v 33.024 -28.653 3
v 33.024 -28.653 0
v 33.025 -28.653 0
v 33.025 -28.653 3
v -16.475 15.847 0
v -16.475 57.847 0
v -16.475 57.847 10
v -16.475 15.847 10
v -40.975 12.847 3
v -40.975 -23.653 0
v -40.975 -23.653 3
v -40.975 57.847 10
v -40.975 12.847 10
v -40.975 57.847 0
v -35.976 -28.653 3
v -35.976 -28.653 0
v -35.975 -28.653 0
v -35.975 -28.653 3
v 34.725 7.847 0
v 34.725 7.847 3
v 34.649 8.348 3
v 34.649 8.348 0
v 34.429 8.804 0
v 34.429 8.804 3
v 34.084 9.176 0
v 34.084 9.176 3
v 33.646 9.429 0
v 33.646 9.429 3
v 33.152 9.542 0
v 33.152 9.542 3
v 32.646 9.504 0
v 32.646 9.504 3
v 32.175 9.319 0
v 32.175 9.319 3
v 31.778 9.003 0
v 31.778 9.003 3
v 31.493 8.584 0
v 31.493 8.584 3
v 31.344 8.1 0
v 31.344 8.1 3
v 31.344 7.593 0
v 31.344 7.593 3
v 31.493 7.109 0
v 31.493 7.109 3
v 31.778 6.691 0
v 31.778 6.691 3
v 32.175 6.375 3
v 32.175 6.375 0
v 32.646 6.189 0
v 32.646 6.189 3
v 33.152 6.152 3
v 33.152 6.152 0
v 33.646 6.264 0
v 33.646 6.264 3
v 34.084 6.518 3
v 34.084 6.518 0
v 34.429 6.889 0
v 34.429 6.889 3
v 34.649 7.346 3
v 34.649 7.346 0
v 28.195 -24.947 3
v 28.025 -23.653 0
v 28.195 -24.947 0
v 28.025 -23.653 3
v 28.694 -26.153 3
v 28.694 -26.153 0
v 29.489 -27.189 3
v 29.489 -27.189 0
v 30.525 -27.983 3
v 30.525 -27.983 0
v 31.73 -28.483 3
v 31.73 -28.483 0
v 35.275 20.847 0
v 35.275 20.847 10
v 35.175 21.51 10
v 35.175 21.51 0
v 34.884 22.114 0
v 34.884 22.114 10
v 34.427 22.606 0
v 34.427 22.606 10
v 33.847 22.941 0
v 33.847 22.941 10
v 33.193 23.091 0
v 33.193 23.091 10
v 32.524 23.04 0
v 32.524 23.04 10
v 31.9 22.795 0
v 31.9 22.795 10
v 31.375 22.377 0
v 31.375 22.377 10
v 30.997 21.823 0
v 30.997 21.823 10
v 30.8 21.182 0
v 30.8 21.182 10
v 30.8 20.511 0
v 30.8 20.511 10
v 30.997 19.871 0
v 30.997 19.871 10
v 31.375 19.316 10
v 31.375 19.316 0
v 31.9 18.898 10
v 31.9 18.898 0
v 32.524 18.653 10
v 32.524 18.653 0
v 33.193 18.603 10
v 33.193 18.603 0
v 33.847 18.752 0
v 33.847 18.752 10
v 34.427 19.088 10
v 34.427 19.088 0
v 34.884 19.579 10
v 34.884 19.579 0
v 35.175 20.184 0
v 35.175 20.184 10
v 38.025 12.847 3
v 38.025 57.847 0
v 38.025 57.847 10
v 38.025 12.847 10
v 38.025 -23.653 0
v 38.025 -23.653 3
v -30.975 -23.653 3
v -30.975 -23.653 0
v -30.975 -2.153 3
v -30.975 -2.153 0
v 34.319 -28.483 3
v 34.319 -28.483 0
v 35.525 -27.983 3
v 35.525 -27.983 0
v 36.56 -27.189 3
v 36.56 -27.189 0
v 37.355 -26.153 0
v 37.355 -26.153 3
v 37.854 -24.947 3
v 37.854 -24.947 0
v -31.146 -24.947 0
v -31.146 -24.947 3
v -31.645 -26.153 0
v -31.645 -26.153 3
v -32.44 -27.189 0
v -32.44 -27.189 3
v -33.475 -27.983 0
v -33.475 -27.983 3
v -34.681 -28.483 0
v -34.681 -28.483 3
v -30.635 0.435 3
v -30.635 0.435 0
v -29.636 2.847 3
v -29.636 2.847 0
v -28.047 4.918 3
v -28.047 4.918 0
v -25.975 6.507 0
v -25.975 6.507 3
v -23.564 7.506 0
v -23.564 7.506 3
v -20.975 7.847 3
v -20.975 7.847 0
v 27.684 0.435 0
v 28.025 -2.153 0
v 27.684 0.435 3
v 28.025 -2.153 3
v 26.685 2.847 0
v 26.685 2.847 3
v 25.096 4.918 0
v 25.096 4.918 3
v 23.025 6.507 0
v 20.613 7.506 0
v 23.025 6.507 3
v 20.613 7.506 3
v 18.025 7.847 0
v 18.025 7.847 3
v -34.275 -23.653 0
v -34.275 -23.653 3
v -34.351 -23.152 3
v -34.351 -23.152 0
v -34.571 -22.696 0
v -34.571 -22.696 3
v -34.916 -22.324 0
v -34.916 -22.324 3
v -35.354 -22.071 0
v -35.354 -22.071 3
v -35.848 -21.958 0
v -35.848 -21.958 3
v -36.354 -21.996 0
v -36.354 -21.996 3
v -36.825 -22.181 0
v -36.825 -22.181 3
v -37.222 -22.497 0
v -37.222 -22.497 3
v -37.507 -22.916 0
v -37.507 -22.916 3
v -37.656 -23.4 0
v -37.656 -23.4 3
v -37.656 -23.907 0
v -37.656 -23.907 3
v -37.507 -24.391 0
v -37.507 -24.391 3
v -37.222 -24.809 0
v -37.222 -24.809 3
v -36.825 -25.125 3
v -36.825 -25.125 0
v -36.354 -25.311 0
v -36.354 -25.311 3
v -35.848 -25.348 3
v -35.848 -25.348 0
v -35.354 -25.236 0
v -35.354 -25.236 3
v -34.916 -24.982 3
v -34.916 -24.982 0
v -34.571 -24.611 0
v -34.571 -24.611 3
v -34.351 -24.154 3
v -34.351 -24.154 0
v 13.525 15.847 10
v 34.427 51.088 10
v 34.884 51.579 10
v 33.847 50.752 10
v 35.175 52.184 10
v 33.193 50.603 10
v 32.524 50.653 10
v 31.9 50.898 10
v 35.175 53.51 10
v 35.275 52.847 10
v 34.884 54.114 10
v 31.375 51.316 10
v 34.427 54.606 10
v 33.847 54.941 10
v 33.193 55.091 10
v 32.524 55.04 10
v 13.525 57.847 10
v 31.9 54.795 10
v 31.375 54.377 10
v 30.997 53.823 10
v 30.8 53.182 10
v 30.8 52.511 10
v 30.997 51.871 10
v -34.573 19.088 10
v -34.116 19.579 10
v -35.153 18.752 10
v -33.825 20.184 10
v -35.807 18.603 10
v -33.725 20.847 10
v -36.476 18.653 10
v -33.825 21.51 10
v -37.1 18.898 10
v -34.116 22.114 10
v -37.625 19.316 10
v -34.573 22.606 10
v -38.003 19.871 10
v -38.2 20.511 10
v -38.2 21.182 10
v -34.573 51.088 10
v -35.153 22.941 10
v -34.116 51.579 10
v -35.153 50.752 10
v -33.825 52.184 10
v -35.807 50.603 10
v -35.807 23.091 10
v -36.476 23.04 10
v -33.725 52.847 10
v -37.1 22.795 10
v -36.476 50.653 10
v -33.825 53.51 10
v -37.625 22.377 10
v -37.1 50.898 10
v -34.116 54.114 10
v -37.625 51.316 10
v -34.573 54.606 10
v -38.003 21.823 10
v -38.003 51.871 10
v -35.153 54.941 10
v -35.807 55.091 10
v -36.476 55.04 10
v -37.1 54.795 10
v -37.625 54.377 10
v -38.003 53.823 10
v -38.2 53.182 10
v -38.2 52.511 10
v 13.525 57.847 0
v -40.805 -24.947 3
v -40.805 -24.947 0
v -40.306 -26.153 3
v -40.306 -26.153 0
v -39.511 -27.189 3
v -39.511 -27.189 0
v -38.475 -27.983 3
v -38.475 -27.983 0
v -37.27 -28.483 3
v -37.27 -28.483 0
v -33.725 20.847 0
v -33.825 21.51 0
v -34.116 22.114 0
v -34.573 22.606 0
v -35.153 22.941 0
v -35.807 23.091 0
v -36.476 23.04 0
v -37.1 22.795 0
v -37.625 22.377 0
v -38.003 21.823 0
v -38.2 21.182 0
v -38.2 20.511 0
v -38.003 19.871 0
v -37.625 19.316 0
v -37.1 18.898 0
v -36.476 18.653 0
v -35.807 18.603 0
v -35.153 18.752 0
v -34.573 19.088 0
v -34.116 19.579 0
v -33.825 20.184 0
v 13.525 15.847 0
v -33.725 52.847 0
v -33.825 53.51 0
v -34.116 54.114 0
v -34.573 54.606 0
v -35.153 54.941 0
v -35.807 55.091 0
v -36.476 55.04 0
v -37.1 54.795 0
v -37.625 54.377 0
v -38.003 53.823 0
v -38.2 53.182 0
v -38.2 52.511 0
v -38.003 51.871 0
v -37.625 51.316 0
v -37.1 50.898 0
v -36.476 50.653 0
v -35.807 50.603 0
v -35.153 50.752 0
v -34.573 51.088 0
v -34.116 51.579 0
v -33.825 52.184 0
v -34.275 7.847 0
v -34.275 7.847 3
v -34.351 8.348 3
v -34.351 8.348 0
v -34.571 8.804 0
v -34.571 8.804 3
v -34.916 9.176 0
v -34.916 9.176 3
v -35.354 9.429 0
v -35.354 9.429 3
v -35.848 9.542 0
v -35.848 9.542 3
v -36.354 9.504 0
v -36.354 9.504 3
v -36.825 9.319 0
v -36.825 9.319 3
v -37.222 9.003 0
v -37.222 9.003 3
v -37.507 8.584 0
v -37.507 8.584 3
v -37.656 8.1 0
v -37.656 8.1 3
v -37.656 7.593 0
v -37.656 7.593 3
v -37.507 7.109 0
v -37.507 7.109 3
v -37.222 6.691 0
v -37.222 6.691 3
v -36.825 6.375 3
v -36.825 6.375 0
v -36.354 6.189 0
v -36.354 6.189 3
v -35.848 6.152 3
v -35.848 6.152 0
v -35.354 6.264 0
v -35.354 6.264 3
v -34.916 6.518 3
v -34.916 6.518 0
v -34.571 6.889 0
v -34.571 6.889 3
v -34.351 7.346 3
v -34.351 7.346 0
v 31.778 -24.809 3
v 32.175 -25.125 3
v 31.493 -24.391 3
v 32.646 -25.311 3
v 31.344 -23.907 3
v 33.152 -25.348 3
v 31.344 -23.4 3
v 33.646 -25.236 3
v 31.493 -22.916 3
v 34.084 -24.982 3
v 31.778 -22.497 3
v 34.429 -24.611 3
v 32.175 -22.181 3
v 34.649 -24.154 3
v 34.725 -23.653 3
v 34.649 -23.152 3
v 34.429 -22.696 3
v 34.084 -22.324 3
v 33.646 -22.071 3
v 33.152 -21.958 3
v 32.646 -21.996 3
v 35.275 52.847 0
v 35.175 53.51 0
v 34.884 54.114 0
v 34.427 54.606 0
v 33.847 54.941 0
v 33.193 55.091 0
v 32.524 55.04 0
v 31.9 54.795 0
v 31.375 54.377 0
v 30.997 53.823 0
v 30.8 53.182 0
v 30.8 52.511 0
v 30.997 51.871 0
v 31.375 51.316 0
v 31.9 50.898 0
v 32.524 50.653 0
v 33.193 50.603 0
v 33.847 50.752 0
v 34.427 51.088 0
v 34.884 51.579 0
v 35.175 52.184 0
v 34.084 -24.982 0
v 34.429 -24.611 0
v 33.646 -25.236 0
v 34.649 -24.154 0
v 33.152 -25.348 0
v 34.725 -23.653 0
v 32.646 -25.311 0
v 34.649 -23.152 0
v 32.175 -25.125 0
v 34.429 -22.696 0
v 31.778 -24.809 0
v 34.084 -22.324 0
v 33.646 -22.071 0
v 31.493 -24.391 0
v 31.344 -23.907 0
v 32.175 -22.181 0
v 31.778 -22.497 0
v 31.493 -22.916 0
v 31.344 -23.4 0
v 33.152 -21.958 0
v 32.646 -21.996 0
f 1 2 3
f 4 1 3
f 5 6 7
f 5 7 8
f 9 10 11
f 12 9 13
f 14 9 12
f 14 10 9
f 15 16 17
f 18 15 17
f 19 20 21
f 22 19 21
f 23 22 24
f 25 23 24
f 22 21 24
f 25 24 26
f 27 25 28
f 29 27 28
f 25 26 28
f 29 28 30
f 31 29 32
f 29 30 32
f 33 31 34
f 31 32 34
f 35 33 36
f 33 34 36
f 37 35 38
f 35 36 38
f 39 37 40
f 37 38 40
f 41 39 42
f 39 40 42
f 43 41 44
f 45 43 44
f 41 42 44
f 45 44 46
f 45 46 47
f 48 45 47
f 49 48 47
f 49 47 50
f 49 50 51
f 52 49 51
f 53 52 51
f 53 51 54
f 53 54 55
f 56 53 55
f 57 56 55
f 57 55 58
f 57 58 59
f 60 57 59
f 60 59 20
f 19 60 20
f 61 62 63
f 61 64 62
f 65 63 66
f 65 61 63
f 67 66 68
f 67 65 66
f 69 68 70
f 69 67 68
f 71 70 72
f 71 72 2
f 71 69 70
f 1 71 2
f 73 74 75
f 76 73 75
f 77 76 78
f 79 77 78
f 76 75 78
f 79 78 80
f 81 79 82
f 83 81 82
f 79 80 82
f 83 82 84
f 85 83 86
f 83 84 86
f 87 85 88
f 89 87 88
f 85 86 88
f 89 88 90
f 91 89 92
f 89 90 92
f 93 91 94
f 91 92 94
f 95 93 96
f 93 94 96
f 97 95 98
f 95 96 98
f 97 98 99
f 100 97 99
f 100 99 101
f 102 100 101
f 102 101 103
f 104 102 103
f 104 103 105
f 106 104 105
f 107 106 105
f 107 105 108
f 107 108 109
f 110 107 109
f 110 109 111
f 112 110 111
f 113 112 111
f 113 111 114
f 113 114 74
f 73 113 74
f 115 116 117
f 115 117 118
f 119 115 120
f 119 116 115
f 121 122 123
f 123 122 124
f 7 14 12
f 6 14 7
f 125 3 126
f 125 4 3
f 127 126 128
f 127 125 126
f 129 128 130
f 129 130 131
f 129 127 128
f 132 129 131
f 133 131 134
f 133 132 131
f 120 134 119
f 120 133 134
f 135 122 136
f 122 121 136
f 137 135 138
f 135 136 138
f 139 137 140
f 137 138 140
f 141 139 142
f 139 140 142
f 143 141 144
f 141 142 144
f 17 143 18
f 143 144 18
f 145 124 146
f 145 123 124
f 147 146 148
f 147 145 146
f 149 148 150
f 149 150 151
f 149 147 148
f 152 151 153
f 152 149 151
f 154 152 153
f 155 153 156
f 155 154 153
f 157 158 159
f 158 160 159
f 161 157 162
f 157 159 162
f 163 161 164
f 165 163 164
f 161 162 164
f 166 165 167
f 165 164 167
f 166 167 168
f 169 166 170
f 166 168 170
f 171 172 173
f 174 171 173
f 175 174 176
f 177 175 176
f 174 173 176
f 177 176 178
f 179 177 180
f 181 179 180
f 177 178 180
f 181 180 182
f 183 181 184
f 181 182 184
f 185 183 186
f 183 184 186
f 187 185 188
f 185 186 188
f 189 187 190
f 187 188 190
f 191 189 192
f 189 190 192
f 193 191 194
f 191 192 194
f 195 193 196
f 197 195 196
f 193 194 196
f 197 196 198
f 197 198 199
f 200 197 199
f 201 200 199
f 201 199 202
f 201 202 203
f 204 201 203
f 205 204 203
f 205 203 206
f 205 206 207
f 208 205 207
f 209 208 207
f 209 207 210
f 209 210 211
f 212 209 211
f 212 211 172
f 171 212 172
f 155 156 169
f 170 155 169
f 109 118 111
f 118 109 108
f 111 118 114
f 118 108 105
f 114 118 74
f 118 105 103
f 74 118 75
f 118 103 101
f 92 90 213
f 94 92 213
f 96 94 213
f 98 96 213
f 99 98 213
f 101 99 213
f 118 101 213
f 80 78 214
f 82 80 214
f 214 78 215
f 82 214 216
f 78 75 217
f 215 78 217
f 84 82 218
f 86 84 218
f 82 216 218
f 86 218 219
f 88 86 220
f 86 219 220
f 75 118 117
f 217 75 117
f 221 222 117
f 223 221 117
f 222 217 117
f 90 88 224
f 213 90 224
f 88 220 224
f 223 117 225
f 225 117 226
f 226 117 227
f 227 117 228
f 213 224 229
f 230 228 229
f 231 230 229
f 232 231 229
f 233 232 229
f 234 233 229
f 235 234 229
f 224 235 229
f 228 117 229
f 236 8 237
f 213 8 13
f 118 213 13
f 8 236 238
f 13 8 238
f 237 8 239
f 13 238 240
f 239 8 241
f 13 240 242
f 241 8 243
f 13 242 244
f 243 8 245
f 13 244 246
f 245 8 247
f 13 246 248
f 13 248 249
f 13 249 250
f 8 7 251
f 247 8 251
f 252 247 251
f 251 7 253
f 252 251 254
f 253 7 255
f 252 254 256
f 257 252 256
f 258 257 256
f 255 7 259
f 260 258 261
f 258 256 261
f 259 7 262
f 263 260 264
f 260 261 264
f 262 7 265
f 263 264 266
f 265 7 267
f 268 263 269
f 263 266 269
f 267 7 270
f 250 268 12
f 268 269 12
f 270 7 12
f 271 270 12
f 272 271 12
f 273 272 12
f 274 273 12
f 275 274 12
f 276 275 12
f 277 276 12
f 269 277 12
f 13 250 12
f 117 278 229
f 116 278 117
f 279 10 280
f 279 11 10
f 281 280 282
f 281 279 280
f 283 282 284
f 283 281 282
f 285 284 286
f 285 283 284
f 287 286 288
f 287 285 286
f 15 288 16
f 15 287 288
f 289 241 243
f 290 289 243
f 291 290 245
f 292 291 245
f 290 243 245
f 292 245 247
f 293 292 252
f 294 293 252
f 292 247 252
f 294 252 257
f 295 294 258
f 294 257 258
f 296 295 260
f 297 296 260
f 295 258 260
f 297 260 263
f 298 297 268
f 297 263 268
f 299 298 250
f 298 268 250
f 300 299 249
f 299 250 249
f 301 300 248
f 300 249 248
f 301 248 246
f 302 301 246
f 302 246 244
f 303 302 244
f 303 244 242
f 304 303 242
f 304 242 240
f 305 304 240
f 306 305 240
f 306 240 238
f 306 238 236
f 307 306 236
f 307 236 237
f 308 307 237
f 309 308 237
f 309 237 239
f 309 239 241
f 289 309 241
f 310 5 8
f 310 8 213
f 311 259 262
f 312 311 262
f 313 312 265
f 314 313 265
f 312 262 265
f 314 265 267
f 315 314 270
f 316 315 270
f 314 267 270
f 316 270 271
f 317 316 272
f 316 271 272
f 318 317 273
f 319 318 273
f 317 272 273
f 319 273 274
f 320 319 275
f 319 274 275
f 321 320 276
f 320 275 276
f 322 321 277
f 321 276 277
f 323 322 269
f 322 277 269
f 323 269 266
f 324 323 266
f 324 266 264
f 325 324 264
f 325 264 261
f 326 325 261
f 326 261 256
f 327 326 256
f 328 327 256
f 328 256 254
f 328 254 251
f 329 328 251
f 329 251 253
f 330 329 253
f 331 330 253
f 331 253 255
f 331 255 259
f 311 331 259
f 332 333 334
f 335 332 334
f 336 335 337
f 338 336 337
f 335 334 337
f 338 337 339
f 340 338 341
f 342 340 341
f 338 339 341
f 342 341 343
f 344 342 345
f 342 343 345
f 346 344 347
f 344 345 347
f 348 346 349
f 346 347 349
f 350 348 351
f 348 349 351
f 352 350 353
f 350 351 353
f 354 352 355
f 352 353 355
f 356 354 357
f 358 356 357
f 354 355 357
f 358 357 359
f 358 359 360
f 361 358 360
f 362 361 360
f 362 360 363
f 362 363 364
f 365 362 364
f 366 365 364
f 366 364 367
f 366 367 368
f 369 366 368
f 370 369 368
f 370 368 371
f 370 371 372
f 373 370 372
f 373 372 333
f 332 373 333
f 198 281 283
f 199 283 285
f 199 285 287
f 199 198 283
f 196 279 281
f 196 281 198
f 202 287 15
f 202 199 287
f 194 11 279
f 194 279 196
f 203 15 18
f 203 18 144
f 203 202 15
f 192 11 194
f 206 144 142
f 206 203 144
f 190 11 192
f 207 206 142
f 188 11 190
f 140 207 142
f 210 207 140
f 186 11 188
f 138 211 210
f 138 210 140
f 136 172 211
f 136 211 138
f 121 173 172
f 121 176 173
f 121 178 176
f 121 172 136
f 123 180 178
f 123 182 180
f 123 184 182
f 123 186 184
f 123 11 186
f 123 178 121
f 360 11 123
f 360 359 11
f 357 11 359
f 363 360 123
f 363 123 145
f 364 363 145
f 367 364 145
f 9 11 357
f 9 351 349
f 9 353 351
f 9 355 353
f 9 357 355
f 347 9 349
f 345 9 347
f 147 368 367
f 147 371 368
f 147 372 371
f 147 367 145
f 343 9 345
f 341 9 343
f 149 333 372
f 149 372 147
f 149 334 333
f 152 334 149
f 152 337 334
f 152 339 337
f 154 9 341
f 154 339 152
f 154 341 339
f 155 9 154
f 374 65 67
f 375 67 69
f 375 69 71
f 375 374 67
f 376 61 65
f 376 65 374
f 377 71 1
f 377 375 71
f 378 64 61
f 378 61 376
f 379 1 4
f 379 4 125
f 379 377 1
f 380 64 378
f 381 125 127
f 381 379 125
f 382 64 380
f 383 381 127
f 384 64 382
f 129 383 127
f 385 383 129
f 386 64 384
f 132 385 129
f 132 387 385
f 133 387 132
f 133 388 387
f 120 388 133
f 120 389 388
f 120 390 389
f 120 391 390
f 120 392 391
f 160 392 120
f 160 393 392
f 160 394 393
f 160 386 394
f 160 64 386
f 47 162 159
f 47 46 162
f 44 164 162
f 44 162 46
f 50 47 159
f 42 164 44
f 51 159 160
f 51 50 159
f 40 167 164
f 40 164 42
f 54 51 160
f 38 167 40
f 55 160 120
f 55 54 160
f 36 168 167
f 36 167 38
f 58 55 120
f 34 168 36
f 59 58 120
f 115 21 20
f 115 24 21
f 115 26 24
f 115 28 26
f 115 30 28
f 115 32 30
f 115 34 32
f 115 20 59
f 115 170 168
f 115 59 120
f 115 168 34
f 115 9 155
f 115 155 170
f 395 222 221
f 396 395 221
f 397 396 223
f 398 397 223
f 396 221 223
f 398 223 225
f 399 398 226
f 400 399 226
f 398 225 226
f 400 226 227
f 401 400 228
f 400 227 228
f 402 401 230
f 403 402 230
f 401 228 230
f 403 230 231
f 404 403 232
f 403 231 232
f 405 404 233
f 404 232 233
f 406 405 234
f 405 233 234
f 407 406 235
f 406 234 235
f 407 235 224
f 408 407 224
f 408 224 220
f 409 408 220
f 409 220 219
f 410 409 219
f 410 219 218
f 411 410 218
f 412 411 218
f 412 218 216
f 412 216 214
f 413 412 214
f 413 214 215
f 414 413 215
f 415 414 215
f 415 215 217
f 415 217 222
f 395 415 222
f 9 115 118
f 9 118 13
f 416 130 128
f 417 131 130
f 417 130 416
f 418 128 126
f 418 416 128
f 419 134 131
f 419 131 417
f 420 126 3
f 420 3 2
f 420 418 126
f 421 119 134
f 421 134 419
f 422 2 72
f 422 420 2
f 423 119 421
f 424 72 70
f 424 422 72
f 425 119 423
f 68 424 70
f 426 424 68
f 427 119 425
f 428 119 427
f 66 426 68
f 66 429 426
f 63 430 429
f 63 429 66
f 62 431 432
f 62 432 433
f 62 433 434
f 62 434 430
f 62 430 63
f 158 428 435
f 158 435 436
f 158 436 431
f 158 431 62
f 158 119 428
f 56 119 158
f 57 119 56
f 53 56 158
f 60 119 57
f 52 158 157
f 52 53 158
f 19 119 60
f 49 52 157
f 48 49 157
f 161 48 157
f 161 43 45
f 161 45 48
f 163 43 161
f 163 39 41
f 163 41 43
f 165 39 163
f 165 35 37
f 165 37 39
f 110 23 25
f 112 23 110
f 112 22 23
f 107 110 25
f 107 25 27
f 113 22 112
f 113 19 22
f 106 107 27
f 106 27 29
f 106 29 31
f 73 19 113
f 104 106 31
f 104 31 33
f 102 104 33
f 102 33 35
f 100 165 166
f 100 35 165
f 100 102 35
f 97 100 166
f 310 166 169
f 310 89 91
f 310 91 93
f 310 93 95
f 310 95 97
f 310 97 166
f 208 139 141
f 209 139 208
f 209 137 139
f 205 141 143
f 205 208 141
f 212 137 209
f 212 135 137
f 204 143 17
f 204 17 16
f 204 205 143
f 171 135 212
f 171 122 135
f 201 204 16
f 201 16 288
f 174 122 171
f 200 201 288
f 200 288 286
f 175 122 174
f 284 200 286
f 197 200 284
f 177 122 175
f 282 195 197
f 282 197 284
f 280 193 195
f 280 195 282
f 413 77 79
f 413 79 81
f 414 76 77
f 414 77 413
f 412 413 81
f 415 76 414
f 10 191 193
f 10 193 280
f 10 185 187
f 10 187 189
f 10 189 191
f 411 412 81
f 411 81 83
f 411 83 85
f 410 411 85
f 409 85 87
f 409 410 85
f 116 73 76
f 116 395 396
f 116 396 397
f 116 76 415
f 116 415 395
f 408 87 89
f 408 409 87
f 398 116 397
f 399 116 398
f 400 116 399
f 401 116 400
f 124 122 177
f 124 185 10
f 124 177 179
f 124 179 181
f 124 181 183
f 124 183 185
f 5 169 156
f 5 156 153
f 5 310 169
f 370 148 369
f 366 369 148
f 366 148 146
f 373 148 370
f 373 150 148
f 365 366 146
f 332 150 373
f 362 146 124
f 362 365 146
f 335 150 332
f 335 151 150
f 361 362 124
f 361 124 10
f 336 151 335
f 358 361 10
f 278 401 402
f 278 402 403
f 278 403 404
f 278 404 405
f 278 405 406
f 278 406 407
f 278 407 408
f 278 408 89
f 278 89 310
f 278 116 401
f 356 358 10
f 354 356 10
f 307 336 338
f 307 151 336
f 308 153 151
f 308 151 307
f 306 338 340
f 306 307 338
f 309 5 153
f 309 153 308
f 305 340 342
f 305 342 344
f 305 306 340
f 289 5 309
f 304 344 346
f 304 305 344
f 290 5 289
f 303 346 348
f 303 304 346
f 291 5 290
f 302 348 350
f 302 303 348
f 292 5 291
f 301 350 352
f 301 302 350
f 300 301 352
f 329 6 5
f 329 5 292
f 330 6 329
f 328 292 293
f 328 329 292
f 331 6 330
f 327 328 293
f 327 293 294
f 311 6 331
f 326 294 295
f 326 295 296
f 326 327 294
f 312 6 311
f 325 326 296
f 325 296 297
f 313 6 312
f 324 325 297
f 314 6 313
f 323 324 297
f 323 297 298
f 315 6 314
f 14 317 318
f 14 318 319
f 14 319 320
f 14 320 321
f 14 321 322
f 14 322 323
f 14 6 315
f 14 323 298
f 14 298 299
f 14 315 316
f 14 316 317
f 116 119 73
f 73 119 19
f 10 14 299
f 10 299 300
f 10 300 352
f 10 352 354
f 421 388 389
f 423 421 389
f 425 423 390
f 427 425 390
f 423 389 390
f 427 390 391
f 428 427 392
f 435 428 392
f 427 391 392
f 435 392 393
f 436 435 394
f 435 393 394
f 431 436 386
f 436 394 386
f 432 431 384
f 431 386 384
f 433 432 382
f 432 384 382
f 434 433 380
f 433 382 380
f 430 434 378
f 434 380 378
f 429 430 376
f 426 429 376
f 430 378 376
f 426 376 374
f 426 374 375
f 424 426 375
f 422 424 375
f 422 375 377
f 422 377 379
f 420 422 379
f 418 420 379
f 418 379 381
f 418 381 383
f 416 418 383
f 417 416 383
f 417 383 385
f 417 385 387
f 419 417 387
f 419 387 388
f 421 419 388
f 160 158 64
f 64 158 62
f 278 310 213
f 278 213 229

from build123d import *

# Parameters (mm, degrees)
BOSS_EXTRUDE1_DEPTH  = 3
FILLET1_R            = 10
FILLET2_R            = 5
M3_CLEARANCE_HOLE1_D = 3.4
BOSS_EXTRUDE3_DEPTH  = 10
M4_CLEARANCE_HOLE1_D = 4.5


with BuildPart() as part:
    # Sketch1 → Boss-Extrude1 (new body)
    with BuildSketch(Plane.XY):
        Polygon((28.024558014, 7.846809304), (28.024558014, -28.653190696), (38.024558014, -28.653190696), (38.024558014, 12.846809304), (-40.975441986, 12.846809304), (-40.975441986, -28.653190696), (-30.975441986, -28.653190696), (-30.975441986, 7.846809304), align=None)
    extrude(amount=BOSS_EXTRUDE1_DEPTH)

    # Fillet1
    fillet1_edges = [part.edges().sort_by_distance(p)[0] for p in [
        (28.024558014, 7.846809304, 1.5),
        (-30.975441986, 7.846809304, 1.5),
    ]]
    fillet(fillet1_edges, radius=FILLET1_R)

    # Fillet2
    fillet2_edges = [part.edges().sort_by_distance(p)[0] for p in [
        (-30.975441986, -28.653190696, 1.5),
        (-40.975441986, -28.653190696, 1.5),
        (28.024558014, -28.653190696, 1.5),
        (38.024558014, -28.653190696, 1.5),
    ]]
    fillet(fillet2_edges, radius=FILLET2_R - 0.0001)  # a hair under: the kernel refuses the full size

    # M3 Clearance Hole1 (through all)
    with Locations(Plane(origin=(0, 0, 0), x_dir=(-1, 0, 0), z_dir=(0, 0, -1))):
        with Locations((-33.024558014, 7.846809304), (35.975441986, -23.653190696), (35.975441986, 7.846809304), (-33.024558014, -23.653190696)):
            Hole(M3_CLEARANCE_HOLE1_D / 2)

    # Sketch5 → Boss-Extrude3 (add)
    with BuildSketch(Plane(origin=(0, 0, 0), x_dir=(-1, 0, 0), z_dir=(0, 0, -1))):
        Polygon((-38.024558014, 57.846809304), (-38.024558014, 12.846809304), (40.975441986, 12.846809304), (40.975441986, 57.846809304), (16.475441986, 57.846809304), (16.475441986, 15.846809304), (-13.524558014, 15.846809304), (-13.524558014, 57.846809304), align=None)
    extrude(amount=-BOSS_EXTRUDE3_DEPTH)

    # M4 Clearance Hole1 (through all)
    with Locations(Plane(origin=(0, 0, 0), x_dir=(-1, 0, 0), z_dir=(0, 0, -1))):
        with Locations((-33.024558014, 52.846809304), (-33.024558014, 20.846809304), (35.975441986, 20.846809304), (35.975441986, 52.846809304)):
            Hole(M4_CLEARANCE_HOLE1_D / 2)


solid = part.part
